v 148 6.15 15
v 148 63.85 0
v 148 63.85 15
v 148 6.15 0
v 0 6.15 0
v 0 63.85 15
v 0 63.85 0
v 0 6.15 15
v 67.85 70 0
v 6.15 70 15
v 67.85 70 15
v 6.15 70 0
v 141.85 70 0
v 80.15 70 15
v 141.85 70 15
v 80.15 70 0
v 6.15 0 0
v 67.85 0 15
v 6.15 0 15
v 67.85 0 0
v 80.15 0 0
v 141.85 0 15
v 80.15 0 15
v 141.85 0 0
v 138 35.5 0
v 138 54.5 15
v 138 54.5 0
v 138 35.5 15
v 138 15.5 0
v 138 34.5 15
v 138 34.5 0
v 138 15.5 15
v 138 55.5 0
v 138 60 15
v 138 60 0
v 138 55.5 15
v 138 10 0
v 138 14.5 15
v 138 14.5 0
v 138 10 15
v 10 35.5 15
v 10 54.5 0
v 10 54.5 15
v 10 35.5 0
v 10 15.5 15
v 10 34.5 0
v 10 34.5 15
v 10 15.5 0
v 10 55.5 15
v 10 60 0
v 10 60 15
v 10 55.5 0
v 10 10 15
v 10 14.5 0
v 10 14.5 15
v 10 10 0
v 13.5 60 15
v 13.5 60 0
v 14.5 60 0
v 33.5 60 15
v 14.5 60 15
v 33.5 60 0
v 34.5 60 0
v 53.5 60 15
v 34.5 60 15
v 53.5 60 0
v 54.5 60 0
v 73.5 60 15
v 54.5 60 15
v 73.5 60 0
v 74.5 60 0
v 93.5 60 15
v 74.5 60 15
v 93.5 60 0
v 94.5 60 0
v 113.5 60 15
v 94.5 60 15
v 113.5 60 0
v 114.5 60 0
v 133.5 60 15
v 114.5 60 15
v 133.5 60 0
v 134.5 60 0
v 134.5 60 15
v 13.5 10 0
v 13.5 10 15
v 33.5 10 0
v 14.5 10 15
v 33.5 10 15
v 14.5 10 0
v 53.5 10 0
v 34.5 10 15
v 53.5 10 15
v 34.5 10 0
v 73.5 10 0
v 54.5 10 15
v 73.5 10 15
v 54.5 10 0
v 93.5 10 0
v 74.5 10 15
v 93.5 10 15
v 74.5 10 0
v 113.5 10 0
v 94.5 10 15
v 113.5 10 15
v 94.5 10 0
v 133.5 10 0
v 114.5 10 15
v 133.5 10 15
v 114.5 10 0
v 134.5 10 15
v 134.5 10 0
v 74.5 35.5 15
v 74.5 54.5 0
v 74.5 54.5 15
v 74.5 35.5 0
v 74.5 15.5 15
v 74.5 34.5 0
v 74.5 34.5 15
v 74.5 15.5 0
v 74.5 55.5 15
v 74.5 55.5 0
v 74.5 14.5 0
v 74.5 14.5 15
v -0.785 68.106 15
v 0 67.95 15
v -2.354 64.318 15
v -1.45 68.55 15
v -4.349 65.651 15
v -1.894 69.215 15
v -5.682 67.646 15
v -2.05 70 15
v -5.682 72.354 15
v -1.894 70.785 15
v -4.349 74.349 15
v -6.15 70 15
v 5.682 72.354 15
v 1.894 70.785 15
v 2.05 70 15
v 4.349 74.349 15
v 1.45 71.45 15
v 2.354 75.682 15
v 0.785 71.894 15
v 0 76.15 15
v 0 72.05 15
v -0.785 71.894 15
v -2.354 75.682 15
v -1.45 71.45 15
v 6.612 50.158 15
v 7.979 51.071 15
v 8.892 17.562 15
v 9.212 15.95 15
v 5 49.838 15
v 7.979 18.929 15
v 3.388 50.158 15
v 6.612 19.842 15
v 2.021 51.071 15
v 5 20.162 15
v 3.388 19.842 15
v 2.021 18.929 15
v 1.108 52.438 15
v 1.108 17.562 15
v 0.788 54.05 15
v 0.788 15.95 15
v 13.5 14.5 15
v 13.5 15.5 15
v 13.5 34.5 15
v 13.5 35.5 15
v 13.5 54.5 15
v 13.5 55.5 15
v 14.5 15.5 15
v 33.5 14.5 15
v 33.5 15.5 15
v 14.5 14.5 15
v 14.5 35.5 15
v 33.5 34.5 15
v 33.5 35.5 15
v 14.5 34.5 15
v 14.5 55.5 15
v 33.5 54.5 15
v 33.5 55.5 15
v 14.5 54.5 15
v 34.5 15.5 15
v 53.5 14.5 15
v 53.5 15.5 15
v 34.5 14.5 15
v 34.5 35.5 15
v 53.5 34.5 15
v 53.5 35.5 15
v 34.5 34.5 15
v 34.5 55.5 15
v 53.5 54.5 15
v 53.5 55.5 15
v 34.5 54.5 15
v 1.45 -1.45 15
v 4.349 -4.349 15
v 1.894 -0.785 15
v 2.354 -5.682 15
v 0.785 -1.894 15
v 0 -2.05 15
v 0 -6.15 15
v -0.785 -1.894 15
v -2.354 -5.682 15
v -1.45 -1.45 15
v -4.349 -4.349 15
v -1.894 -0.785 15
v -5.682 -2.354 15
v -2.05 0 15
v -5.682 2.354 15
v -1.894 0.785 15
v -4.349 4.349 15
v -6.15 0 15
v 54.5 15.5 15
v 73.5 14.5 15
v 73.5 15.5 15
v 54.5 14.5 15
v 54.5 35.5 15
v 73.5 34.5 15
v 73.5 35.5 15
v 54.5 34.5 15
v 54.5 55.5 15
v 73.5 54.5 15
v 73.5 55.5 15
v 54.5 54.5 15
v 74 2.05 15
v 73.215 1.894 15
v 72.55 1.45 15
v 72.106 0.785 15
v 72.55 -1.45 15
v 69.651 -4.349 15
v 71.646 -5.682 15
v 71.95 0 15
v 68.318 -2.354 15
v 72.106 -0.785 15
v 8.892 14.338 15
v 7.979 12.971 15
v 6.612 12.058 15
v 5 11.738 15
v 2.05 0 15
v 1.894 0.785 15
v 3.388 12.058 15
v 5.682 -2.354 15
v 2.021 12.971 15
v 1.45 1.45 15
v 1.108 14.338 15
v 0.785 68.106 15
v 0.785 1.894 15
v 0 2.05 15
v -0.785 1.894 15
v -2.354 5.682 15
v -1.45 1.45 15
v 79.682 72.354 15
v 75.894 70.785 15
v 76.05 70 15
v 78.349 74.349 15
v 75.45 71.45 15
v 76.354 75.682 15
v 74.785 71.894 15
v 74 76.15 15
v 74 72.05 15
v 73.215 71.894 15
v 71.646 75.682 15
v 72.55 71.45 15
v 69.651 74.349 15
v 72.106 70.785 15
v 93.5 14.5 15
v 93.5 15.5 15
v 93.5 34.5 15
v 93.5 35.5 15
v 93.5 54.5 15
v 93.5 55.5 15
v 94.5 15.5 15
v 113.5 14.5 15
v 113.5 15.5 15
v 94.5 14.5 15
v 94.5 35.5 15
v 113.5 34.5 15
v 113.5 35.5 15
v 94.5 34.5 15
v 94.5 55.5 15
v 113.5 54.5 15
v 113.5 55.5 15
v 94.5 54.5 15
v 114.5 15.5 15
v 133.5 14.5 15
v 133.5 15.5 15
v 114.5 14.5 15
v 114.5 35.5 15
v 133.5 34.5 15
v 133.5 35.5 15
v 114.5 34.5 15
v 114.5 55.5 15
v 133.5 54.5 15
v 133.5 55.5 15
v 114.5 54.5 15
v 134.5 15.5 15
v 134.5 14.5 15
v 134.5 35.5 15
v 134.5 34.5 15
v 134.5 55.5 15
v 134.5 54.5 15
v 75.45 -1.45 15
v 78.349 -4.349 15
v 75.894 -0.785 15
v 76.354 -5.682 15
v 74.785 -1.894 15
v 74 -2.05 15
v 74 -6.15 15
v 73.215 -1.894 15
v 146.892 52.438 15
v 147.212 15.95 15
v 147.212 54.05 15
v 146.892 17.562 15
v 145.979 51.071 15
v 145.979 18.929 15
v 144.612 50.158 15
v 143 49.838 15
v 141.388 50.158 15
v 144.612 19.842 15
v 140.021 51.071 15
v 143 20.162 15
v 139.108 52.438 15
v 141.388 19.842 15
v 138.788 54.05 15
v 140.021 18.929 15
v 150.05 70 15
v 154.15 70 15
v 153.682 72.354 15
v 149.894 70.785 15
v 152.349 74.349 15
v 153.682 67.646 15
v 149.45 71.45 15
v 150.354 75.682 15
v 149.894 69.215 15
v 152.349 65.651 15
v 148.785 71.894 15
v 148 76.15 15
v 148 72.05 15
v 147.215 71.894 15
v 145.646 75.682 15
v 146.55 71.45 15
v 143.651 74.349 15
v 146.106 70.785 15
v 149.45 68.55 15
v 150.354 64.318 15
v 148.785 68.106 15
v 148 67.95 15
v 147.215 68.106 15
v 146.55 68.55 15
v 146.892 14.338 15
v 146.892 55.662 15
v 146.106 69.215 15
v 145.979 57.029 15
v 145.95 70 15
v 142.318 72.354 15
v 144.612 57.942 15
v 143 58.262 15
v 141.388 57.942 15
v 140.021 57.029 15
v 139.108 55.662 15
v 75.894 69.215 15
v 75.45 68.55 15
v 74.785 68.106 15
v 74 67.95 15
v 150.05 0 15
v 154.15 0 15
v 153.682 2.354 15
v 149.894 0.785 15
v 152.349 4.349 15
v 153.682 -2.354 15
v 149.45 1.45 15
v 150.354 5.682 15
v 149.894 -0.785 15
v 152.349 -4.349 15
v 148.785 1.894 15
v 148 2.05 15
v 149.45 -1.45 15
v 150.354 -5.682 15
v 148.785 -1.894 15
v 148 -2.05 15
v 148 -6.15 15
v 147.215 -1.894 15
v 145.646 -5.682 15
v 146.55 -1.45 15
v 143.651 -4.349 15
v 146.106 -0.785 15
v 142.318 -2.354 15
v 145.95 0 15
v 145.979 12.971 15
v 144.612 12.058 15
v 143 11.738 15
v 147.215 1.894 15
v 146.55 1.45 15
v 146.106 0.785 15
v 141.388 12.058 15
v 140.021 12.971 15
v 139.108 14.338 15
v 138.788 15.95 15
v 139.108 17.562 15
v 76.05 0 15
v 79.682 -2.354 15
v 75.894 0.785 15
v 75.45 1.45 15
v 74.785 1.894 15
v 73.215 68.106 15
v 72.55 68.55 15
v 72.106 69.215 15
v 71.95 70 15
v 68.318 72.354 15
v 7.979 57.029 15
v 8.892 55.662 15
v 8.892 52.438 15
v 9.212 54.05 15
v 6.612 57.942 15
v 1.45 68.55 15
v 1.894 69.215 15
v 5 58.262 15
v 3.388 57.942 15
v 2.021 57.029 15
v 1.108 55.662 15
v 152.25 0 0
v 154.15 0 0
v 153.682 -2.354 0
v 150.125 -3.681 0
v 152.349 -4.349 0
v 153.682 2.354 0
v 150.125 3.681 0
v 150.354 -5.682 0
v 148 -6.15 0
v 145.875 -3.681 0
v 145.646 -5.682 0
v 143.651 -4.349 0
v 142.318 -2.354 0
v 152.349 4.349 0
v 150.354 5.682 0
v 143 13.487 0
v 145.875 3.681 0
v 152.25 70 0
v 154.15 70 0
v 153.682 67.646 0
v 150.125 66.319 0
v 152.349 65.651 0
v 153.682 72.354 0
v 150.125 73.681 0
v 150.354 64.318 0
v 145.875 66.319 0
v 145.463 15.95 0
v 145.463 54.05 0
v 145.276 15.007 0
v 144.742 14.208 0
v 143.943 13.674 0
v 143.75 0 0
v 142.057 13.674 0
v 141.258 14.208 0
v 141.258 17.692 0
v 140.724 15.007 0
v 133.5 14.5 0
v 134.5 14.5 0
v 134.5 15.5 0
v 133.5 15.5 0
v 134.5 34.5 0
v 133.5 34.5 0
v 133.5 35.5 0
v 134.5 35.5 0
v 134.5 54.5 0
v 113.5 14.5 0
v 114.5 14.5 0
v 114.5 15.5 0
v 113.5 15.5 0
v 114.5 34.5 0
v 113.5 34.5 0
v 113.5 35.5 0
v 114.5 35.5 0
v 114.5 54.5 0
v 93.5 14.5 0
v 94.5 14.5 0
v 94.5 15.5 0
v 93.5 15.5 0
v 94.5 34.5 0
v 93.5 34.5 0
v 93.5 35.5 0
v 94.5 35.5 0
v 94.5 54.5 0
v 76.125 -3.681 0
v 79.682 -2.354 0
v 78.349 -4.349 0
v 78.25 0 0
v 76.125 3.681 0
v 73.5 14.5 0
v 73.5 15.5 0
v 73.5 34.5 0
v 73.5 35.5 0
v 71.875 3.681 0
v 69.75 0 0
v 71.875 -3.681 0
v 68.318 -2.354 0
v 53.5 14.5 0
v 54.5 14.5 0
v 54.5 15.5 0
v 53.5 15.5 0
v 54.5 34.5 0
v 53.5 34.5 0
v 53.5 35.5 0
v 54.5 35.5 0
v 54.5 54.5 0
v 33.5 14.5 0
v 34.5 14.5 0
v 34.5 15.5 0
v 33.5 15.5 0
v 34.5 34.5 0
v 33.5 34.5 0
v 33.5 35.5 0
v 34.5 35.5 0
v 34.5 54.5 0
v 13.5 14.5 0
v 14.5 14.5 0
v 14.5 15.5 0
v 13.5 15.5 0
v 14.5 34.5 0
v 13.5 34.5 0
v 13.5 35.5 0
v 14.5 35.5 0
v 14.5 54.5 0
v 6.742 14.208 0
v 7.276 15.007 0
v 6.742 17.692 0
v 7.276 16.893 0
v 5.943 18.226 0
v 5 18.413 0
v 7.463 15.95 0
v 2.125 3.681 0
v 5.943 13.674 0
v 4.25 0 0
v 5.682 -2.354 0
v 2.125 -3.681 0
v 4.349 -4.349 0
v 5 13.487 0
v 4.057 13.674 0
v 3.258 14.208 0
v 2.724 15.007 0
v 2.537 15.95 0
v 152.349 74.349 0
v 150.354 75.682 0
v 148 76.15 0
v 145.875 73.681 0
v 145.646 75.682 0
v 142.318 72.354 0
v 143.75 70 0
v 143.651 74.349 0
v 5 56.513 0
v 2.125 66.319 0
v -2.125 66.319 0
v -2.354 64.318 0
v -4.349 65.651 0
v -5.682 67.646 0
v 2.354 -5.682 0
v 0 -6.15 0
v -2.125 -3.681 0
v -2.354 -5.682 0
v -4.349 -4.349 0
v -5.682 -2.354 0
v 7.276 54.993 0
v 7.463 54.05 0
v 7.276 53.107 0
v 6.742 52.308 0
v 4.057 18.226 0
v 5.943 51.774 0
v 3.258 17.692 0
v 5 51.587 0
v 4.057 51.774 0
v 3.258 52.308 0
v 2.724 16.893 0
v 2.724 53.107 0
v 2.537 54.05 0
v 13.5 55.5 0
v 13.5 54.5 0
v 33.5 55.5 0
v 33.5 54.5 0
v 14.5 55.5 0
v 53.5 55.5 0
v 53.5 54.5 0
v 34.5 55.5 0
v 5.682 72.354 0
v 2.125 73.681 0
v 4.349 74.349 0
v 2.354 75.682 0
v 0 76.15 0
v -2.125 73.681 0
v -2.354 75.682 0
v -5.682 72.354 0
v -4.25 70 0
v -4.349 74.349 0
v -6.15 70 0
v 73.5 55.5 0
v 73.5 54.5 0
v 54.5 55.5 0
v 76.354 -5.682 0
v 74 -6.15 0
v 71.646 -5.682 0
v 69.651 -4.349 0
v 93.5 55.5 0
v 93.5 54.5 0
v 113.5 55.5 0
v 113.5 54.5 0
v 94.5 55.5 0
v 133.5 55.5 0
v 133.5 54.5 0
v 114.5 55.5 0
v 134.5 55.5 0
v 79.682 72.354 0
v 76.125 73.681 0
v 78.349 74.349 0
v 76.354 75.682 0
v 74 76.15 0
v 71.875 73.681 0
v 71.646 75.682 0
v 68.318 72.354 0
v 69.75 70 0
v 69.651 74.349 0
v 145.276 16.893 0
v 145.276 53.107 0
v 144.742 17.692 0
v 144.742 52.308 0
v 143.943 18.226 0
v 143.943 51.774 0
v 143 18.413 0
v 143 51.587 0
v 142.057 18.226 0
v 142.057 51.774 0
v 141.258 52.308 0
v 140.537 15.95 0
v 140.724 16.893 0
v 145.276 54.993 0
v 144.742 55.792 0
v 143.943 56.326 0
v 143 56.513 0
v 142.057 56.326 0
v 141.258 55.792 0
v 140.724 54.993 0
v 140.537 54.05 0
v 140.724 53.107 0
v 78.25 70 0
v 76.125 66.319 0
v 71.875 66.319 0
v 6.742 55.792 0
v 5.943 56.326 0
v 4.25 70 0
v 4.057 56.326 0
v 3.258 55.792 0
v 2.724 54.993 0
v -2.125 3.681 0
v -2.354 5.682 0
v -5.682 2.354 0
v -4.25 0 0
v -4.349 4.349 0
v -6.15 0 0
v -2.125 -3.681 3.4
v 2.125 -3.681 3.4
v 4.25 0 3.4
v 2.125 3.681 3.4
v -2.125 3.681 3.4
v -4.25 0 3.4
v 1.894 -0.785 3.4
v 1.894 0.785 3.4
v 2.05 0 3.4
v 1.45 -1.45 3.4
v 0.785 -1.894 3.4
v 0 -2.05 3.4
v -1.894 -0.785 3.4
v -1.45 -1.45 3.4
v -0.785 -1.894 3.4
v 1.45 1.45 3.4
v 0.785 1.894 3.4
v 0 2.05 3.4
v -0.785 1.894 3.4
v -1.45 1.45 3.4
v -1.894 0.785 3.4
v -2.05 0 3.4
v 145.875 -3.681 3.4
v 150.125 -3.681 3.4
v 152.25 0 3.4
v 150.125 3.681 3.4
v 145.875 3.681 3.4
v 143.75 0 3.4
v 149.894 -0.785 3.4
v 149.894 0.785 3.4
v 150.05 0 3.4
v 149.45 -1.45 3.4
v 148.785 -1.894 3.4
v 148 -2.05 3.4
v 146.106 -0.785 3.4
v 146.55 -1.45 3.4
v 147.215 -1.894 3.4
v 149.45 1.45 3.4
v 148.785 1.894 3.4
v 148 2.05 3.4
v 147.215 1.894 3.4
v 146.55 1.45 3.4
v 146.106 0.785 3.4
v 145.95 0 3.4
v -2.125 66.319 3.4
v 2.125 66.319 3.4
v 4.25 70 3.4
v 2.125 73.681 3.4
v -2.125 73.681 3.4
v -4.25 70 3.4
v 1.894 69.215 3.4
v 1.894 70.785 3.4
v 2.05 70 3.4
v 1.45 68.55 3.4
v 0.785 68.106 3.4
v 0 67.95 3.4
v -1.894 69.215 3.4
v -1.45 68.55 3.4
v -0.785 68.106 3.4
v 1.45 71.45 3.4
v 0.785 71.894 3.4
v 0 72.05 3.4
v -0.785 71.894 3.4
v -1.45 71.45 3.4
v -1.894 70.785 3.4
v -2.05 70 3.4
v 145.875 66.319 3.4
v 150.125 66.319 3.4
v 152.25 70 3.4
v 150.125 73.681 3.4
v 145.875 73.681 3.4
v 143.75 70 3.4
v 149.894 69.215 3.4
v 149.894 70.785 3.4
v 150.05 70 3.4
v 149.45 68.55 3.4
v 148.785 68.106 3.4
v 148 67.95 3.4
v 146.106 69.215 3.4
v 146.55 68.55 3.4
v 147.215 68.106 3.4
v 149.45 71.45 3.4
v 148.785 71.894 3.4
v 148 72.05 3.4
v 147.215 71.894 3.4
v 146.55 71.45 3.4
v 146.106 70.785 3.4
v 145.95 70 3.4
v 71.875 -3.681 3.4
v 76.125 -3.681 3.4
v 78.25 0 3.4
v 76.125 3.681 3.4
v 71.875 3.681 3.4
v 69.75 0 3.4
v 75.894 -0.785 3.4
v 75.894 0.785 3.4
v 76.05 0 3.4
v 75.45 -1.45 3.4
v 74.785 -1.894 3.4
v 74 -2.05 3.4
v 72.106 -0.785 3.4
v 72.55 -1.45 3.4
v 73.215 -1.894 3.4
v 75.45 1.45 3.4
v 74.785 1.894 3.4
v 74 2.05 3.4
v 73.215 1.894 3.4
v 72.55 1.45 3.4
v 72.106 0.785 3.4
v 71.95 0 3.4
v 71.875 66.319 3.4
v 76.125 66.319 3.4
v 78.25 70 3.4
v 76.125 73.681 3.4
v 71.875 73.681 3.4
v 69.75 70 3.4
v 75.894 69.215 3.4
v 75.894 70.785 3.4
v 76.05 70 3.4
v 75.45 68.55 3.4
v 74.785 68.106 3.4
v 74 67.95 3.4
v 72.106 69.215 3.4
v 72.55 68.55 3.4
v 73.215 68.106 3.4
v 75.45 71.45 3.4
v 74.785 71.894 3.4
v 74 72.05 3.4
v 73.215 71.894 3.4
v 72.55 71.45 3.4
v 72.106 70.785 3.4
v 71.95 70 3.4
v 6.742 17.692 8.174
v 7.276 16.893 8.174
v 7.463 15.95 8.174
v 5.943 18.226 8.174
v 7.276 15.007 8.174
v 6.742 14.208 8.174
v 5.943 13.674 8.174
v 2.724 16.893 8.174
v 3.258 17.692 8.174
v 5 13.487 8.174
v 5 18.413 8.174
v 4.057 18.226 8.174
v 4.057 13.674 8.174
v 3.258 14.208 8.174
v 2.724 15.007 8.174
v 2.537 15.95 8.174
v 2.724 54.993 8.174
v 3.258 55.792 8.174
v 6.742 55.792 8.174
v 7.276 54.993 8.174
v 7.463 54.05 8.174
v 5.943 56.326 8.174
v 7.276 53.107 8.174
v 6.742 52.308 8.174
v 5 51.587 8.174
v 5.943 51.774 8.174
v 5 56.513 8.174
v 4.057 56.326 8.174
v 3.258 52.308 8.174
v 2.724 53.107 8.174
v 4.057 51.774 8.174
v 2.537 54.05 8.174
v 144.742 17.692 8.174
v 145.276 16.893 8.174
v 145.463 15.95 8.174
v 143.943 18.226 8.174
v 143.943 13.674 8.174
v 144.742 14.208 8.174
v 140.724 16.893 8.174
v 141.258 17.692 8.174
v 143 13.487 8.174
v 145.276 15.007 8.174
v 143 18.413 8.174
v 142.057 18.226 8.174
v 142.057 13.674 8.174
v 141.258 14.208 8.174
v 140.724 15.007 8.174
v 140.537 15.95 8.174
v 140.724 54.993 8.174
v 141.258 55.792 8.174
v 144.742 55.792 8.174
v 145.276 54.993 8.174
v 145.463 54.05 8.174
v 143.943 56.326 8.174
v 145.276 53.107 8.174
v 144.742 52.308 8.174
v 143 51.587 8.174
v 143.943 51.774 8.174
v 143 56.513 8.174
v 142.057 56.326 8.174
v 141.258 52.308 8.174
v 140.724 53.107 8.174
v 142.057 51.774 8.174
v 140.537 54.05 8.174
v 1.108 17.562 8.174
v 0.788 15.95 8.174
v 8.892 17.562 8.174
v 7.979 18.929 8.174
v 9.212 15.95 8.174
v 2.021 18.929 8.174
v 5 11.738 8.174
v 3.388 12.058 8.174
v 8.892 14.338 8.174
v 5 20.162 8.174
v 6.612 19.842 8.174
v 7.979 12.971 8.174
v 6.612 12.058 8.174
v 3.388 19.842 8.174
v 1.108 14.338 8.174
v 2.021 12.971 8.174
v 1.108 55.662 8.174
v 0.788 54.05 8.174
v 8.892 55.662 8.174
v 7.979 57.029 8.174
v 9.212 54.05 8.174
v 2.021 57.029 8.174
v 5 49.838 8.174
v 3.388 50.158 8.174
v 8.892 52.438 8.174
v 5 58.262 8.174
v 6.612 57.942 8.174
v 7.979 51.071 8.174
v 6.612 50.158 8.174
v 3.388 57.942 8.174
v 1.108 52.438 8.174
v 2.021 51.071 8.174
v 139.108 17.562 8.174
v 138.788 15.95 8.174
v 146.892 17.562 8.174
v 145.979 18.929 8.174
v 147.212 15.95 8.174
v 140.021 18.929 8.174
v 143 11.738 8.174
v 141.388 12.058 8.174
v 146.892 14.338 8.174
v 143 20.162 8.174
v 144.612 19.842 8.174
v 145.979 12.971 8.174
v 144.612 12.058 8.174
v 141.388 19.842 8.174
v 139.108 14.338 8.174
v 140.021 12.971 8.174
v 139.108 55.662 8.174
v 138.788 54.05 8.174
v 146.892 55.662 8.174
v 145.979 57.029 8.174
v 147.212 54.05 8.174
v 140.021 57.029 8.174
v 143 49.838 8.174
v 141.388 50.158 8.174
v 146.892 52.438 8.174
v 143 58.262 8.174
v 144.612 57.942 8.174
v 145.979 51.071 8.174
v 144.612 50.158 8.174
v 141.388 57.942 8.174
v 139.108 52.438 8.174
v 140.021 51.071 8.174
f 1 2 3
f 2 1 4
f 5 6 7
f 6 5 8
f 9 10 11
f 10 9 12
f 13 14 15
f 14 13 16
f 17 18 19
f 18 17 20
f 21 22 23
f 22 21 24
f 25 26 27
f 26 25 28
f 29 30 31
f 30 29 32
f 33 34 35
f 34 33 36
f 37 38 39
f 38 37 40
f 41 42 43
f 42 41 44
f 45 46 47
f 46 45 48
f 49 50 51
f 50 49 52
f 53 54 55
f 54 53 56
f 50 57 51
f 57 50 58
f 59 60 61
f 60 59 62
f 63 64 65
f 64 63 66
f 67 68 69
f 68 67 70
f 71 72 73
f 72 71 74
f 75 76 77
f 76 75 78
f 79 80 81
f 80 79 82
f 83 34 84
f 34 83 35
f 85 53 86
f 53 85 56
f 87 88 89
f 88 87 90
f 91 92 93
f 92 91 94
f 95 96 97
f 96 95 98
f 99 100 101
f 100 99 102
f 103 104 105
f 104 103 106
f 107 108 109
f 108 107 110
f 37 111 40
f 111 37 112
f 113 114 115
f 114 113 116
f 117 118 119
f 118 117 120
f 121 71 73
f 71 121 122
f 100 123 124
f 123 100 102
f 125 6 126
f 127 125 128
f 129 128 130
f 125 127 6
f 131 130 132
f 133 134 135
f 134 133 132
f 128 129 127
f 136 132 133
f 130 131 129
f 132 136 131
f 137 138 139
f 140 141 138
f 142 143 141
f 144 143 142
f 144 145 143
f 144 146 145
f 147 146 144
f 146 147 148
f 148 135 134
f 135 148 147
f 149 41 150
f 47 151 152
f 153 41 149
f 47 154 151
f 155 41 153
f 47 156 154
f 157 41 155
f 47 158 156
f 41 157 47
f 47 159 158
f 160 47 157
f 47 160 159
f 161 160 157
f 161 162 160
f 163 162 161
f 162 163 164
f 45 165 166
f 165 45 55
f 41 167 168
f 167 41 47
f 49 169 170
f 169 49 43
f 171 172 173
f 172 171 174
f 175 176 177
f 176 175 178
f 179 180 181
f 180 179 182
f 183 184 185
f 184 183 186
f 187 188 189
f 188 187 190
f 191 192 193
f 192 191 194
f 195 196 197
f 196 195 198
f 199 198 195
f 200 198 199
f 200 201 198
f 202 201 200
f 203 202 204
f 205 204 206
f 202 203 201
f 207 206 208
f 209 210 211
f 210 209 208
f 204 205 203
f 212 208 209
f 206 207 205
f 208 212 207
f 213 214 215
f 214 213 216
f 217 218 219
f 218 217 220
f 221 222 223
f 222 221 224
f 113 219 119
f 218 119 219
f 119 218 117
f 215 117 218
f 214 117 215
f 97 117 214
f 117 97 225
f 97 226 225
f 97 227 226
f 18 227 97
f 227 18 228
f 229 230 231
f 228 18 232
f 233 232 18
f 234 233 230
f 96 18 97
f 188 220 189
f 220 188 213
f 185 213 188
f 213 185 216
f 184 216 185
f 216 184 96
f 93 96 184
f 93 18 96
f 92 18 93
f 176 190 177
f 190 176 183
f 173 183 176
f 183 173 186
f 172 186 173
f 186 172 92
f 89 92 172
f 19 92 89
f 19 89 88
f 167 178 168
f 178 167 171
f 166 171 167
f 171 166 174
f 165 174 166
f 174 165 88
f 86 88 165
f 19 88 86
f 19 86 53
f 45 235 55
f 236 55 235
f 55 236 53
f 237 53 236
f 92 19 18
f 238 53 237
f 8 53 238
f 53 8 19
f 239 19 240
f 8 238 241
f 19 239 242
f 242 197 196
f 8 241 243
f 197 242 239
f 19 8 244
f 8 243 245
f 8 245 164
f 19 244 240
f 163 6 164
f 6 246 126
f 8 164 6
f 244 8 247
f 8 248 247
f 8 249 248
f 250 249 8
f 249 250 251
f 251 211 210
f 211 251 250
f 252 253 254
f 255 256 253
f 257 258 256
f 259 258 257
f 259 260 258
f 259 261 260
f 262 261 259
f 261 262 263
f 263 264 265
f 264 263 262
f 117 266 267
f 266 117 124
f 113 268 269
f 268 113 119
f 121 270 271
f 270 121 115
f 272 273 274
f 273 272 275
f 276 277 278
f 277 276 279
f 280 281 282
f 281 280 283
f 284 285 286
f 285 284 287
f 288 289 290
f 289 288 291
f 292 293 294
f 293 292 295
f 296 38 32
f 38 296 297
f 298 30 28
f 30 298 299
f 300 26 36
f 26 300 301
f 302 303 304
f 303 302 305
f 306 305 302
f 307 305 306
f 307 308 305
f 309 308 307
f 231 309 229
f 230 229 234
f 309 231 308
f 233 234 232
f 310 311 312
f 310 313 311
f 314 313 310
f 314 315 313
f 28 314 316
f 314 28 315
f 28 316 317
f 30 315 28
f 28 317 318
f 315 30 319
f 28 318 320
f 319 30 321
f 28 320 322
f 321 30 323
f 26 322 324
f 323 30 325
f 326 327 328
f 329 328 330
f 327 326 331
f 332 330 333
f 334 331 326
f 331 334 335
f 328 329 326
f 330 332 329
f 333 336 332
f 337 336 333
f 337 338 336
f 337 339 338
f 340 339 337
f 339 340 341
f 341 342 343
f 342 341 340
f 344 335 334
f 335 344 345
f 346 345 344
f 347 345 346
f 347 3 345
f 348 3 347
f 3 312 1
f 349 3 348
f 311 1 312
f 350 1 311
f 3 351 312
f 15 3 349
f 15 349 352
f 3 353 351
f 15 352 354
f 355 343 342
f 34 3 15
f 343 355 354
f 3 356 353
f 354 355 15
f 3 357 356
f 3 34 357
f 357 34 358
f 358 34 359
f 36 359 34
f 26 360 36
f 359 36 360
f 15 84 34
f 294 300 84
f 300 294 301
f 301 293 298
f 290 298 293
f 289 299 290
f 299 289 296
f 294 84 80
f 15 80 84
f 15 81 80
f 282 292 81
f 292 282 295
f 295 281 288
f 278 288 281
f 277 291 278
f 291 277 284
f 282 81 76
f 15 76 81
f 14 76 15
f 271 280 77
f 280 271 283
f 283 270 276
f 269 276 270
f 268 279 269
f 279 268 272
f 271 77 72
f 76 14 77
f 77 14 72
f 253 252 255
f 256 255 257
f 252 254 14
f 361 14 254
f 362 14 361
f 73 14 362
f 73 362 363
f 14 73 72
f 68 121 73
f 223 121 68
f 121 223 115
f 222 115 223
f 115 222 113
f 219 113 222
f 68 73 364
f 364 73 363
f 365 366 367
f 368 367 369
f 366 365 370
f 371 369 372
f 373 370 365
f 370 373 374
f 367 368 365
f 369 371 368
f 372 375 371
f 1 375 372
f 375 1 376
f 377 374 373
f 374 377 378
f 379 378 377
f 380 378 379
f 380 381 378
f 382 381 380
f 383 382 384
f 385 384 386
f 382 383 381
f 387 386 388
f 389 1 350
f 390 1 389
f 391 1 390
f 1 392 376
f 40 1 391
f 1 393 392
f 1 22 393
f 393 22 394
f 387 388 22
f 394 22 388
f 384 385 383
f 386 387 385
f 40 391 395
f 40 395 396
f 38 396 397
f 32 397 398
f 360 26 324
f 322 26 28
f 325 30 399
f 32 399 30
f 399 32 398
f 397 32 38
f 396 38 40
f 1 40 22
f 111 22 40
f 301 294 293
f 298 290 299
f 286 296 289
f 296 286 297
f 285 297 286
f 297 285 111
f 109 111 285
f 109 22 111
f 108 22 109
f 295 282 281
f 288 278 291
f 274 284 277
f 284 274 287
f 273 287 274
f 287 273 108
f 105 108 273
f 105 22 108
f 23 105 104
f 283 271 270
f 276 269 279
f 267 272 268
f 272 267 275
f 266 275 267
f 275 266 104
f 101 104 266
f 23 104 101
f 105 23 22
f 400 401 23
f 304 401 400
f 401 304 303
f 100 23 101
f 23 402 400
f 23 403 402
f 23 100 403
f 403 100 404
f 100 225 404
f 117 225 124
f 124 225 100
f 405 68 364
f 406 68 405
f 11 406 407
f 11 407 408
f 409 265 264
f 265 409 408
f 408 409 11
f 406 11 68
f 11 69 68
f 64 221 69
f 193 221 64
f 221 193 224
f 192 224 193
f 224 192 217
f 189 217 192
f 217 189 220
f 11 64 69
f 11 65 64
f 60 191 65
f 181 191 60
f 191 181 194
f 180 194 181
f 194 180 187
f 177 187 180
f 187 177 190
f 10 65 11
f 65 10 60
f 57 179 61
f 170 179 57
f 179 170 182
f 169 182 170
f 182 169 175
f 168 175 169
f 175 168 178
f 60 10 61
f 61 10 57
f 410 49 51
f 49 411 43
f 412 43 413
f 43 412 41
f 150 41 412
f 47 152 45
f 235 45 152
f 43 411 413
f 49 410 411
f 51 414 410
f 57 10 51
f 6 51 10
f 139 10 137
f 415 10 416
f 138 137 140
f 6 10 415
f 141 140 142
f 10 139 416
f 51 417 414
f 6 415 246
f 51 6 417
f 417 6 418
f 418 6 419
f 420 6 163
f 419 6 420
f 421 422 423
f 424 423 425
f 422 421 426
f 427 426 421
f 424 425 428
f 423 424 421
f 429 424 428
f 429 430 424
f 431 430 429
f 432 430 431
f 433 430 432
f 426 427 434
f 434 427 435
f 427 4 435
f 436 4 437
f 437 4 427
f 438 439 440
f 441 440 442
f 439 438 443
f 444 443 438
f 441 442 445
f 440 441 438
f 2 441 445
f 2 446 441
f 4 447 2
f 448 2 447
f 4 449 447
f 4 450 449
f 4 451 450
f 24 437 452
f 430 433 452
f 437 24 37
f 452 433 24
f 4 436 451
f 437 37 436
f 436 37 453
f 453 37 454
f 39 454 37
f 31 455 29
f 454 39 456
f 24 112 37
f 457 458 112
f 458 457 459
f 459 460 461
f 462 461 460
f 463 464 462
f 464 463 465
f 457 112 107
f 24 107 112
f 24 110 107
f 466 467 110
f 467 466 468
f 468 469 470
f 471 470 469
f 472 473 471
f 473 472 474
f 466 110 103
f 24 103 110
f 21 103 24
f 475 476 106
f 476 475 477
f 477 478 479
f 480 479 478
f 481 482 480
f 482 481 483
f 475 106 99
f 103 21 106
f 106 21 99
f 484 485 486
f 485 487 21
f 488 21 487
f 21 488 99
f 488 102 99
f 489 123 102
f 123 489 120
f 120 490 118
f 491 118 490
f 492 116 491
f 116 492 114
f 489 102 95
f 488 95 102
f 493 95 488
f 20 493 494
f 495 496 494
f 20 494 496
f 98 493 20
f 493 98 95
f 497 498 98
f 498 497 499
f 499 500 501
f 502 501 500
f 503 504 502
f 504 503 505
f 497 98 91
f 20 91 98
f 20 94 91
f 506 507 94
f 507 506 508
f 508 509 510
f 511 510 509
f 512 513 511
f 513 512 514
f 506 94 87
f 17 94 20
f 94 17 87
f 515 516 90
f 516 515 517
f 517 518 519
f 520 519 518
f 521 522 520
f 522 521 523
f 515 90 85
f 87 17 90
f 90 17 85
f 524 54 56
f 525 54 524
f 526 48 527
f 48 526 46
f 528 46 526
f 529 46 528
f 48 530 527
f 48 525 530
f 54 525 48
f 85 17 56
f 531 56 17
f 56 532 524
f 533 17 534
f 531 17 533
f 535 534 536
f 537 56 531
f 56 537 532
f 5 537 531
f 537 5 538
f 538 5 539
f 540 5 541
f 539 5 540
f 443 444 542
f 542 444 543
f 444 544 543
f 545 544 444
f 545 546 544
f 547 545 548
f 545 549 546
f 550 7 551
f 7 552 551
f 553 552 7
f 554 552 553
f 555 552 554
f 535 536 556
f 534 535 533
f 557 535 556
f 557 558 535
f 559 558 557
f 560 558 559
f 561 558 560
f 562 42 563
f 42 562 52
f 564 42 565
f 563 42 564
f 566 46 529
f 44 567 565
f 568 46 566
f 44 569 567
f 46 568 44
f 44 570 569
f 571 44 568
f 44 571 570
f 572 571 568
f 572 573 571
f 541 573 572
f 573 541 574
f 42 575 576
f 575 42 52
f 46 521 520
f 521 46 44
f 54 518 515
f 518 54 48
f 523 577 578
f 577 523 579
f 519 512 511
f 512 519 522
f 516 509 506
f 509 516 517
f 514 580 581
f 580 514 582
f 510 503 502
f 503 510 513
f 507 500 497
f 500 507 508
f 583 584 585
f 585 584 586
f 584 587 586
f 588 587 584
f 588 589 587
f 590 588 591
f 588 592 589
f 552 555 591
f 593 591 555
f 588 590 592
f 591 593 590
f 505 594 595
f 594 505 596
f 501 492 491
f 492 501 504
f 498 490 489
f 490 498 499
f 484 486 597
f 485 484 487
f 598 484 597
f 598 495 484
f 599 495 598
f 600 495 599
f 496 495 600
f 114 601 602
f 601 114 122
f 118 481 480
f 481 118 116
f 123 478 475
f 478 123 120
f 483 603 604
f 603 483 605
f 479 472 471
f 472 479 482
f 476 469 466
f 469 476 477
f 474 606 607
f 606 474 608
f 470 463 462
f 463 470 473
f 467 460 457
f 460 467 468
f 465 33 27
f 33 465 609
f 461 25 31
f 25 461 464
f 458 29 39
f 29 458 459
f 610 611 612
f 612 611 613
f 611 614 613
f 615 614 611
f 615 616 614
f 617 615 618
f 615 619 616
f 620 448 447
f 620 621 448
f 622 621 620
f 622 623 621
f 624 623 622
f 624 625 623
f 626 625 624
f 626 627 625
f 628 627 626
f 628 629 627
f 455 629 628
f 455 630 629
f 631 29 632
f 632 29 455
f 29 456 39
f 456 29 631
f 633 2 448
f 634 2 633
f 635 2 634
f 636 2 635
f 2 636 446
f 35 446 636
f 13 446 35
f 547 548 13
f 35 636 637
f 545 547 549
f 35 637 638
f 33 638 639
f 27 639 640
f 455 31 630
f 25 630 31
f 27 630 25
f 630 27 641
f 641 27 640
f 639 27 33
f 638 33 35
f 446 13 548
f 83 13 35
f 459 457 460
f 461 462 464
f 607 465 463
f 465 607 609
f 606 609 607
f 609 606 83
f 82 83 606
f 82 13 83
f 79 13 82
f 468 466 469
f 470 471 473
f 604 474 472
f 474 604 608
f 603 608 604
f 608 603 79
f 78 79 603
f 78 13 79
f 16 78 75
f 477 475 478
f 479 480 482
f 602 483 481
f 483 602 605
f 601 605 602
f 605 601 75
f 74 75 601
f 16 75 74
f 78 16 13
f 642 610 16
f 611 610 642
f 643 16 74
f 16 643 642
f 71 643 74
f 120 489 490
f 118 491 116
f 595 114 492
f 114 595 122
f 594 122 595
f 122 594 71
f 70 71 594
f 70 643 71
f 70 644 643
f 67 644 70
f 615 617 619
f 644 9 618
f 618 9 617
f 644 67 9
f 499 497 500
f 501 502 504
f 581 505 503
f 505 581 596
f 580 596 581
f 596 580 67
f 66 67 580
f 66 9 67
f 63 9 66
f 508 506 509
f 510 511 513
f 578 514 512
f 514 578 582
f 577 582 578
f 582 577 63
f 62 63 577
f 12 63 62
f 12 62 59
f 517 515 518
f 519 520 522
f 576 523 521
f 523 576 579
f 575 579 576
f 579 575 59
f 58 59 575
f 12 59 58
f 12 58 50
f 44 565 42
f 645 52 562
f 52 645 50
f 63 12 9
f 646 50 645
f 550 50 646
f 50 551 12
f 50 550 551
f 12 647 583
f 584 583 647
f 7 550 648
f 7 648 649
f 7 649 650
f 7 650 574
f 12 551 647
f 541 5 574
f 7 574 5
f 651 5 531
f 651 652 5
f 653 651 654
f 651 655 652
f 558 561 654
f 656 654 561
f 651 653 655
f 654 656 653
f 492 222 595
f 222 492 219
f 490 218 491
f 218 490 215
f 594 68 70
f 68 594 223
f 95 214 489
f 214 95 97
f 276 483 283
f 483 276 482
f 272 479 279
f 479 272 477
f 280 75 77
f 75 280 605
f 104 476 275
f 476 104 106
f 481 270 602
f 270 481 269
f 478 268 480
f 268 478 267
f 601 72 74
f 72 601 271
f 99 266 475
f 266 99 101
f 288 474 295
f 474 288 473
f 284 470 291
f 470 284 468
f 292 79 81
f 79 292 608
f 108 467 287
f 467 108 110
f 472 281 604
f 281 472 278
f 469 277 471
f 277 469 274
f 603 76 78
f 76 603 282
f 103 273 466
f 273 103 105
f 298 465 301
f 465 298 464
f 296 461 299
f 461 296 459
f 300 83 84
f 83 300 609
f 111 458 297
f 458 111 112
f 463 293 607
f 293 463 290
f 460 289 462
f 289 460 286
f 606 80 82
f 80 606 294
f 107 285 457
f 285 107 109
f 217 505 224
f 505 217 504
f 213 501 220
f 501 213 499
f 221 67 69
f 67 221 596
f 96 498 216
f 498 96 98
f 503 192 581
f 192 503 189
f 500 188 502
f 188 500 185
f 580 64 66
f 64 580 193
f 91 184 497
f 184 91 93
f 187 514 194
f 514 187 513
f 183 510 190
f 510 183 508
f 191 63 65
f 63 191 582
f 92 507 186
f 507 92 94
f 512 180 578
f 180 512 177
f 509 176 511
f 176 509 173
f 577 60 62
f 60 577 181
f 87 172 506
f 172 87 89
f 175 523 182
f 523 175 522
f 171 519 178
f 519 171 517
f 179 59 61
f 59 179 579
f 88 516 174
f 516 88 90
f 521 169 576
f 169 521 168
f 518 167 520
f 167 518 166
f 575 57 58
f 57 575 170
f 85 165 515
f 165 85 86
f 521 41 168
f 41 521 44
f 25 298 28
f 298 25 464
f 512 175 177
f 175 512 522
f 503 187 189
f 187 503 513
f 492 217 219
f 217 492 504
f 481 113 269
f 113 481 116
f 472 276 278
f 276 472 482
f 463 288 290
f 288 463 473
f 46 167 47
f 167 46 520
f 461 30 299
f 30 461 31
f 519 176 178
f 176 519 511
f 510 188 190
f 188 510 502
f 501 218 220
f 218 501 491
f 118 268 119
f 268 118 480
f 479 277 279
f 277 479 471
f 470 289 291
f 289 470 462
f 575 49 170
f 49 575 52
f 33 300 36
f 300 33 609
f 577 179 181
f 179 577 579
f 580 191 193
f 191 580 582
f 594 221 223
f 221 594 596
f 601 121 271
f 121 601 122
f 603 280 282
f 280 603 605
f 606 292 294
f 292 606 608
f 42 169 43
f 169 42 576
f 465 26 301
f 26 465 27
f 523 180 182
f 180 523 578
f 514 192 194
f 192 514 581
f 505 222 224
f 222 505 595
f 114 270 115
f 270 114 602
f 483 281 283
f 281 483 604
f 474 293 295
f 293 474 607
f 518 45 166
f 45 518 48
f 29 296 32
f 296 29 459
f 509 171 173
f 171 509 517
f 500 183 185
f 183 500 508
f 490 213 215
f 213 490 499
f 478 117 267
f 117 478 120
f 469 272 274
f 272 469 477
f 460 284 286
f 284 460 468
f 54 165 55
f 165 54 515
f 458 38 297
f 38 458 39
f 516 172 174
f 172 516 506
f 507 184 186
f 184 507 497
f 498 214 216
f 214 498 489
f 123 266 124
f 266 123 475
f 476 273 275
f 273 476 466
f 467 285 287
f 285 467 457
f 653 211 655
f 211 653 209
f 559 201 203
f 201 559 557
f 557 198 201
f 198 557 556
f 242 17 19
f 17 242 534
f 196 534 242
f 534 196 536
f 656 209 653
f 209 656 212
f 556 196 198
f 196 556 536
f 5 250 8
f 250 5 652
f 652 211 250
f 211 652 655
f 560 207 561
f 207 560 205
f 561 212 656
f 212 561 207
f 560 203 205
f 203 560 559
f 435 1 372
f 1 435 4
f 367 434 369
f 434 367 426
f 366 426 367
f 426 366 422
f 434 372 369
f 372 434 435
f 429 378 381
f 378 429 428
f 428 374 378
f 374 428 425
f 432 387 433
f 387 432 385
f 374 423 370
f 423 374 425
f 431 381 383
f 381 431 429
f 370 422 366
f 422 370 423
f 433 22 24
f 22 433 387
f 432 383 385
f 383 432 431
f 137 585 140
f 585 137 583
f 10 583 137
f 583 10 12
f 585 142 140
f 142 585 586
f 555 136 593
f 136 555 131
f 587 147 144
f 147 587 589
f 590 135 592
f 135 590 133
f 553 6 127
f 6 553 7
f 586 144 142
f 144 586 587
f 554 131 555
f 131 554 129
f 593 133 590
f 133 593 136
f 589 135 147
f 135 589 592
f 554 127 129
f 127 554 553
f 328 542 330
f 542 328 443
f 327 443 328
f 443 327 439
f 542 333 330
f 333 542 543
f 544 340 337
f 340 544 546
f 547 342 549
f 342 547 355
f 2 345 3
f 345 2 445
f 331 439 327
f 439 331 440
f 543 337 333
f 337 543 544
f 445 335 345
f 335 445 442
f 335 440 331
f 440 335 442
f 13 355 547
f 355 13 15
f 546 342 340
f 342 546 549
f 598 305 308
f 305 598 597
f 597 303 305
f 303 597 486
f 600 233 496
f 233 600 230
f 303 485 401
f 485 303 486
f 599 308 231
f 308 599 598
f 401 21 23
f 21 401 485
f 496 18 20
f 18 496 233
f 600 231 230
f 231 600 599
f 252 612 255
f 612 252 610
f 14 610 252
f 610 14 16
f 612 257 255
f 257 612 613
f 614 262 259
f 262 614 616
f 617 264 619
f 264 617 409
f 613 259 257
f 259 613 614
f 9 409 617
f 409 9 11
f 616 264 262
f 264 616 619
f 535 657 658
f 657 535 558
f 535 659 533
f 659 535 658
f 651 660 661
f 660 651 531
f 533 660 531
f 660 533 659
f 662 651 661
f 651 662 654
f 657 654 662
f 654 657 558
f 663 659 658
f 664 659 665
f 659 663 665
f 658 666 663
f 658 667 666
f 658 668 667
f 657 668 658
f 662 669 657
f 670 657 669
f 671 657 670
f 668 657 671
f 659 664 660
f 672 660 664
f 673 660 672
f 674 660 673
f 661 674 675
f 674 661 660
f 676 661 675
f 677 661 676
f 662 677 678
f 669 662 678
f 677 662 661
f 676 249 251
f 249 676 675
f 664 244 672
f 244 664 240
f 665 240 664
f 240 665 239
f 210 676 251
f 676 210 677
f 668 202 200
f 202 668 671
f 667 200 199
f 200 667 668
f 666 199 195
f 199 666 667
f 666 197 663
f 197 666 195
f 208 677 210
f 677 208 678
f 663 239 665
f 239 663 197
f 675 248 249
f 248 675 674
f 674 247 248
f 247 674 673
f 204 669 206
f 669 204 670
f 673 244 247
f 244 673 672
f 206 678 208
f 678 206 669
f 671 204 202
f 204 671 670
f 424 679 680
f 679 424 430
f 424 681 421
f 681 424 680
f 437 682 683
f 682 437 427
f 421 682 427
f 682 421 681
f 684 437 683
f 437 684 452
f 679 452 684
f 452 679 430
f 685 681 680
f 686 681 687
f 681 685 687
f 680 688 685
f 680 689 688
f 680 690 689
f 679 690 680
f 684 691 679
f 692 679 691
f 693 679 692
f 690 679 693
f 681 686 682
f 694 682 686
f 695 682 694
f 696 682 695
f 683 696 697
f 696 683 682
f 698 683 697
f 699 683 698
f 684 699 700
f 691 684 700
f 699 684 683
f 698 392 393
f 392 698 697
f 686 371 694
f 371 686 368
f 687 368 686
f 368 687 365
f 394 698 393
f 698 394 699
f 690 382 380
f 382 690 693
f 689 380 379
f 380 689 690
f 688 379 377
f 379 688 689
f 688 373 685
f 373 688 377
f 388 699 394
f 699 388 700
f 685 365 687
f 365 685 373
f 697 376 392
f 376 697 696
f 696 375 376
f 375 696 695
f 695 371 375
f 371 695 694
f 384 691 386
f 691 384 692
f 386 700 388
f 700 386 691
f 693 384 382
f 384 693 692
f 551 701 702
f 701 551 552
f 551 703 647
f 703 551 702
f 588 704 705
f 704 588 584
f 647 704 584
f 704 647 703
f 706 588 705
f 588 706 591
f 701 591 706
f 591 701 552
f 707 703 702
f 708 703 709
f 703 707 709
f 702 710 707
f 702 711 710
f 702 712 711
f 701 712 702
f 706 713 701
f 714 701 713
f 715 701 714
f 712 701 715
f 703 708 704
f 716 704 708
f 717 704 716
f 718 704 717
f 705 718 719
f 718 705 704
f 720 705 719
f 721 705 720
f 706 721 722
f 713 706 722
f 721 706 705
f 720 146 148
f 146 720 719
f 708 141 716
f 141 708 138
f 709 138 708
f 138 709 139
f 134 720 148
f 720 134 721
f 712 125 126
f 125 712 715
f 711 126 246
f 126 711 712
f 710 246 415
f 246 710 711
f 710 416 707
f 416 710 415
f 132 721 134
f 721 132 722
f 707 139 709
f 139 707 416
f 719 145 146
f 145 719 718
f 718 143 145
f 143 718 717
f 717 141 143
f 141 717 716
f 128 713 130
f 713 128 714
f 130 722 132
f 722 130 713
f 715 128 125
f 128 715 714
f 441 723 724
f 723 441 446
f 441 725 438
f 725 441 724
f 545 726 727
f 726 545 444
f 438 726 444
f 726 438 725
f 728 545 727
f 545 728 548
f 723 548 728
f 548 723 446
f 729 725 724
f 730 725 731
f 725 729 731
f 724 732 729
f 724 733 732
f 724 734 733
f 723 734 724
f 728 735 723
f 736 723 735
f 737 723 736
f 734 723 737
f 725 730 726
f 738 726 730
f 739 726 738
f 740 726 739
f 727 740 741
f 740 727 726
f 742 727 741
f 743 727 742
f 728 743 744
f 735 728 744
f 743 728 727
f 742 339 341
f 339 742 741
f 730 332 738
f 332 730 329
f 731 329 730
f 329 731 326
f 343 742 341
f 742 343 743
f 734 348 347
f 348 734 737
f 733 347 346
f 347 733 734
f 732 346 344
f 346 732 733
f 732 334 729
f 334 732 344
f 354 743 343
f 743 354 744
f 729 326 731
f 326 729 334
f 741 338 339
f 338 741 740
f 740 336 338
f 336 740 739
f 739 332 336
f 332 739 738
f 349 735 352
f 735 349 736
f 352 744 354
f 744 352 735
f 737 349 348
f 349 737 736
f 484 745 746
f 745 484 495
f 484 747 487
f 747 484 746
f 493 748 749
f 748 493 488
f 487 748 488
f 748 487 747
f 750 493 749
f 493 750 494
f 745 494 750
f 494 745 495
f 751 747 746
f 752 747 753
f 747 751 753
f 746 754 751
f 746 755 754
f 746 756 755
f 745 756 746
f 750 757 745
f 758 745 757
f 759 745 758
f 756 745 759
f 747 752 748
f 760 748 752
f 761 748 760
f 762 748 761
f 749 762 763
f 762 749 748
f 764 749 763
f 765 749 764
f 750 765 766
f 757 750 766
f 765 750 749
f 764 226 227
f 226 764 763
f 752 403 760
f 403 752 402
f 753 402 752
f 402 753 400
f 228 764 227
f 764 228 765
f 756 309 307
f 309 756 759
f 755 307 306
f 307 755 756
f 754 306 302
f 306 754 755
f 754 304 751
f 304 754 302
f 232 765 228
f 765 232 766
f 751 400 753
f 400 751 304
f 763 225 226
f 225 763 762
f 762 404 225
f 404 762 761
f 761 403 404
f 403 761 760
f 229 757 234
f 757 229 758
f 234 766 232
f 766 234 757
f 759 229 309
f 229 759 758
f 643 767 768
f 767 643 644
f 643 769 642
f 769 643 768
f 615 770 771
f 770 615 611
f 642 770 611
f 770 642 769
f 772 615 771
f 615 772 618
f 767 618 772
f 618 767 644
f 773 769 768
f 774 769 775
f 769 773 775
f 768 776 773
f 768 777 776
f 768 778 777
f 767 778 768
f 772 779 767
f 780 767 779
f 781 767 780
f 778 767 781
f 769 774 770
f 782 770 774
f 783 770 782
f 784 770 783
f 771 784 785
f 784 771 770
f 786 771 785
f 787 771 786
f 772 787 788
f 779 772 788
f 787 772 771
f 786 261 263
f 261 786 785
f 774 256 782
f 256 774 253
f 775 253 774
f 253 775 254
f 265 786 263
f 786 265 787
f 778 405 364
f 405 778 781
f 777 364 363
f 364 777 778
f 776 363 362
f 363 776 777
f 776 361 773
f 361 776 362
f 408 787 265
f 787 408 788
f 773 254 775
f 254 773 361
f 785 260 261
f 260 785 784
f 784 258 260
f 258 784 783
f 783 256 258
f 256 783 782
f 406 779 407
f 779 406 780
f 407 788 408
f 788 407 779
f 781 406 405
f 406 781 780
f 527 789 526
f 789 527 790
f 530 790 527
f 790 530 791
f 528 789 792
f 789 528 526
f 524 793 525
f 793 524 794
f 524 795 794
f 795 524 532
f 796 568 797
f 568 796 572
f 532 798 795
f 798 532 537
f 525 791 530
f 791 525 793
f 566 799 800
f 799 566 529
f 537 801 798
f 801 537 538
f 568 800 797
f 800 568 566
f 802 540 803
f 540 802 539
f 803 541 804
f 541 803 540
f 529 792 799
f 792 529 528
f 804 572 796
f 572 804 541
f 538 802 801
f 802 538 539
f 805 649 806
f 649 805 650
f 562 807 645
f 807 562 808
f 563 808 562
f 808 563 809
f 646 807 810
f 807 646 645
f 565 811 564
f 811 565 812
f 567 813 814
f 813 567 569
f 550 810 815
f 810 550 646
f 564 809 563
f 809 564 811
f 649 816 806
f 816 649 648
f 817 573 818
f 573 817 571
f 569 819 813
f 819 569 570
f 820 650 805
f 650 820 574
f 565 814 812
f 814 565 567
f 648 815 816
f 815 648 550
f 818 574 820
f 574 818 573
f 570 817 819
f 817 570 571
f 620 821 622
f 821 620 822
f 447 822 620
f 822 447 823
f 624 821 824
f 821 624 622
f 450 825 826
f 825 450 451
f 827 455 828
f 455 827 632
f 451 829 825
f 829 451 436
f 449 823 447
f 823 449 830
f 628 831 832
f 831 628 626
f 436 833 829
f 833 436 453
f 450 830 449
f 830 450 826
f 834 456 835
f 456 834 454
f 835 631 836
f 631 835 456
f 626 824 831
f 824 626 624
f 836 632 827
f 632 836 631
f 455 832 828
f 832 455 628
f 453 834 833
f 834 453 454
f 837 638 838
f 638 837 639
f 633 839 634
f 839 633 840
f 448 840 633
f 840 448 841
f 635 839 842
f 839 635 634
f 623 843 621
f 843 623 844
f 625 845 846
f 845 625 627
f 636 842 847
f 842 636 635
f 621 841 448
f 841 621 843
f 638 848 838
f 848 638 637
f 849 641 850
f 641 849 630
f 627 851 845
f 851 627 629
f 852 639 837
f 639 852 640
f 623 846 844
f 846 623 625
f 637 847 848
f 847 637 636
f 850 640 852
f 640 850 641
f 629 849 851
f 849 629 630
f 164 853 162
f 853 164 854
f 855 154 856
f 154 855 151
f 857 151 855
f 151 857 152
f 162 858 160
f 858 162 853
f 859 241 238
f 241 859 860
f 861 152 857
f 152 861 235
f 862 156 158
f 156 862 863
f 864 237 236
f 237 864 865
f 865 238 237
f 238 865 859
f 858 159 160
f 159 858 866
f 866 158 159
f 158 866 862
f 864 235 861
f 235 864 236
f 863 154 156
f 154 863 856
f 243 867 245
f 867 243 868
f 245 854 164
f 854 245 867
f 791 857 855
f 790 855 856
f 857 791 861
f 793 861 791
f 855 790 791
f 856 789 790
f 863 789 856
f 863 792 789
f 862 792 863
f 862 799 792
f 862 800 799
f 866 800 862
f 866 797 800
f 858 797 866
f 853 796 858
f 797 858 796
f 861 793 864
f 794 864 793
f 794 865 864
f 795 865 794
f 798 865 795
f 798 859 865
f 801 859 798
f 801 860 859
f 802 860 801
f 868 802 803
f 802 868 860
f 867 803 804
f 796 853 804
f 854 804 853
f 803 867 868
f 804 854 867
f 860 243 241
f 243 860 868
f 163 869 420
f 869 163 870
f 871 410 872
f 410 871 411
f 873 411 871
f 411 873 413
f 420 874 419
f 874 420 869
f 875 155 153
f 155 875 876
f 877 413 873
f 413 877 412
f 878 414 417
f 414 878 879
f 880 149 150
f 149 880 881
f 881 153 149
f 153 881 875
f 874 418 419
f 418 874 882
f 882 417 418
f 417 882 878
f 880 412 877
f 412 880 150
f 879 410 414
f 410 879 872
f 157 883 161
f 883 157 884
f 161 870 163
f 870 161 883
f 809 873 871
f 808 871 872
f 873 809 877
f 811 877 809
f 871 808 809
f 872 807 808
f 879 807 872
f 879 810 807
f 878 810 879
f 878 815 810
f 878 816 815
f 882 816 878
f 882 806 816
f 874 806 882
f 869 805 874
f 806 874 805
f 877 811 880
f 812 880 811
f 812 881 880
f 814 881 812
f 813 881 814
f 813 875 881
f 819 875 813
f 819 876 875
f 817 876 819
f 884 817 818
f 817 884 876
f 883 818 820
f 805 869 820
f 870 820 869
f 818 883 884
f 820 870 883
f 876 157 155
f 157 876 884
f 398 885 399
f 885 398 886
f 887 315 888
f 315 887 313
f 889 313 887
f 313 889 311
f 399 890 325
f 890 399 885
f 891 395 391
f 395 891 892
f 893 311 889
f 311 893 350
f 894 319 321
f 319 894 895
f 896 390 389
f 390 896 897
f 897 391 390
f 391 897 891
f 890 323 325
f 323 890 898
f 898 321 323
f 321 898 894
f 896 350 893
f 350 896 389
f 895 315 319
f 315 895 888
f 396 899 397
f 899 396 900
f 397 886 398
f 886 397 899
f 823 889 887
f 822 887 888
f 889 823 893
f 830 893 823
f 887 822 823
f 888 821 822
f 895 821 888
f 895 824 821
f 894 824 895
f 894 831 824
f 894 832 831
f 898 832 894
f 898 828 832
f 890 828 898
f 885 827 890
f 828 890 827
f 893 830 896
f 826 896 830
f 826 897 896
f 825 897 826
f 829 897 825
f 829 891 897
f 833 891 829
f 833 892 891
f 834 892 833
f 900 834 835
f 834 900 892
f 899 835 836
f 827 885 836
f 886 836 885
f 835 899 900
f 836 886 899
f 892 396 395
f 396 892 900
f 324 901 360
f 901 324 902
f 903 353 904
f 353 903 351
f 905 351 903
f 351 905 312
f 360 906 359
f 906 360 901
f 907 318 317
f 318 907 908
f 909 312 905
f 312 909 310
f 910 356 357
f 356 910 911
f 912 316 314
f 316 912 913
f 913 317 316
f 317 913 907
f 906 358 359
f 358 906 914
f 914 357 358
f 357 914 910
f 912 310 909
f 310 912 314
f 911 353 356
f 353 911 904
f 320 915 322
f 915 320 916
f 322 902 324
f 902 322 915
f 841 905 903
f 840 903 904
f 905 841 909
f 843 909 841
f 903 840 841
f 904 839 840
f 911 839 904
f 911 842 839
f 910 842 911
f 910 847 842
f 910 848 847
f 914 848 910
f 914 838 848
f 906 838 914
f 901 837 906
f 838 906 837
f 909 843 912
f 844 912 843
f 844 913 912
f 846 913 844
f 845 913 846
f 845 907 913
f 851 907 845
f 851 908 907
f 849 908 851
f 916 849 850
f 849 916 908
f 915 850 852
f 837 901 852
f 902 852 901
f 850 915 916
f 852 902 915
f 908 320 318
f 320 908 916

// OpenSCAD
// file: grid.scad
/* This module creates grids. */

module grid(
   gridX, 
   gridY, 
   borderX, 
   borderY, 
   meshSolid,    // width of solid part of grid
   meshSpace,    // width of space part of grid
   thickness) {  // z height 

   /* Calculate the size of the dimensions of the meshed area. */
   meshX=gridX-(borderX*2);
   meshY=gridY-(borderY*2);

   echo (meshX,  meshY);

   /* Calculate the number of lines in the meshed area. */
   nX=floor(meshX/(meshSolid+meshSpace));
   nY=floor(meshY/(meshSolid+meshSpace));
   gridSize = meshSolid + meshSpace;
   echo (nX, nY, gridSize);


   intersection () {

      union() {
         /* 
          *  Draw the border box centered. 
          */
         difference() {
            cube (size=[gridX,gridY,thickness+ 2], center=true);
            cube (size=[meshX,meshY,thickness+ 2], center=true);
         } /* enddifference */
         
      
         /* 
          *  Draw the grid centered. 
          */
      
         /* Draw the lines parallel to y axis. */
         translate([-1 * (meshSolid / 2), 0, -1 * (thickness / 2)])
            union() {
               for (i = [0 : ceil(nX / 2)]) {
                  translate([i*(meshSolid+meshSpace), -1 * (gridY / 2), 0]) 
                     cube(size=[meshSolid, gridY, thickness]);
               } /* endfor */
               for (i = [0 : ceil(nX / 2)]) {
                  translate([-1 * i*(meshSolid+meshSpace), -1 * (gridY / 2), 0]) 
                     cube(size=[meshSolid, gridY, thickness]);
               } /* endfor */
            } /* endunion */
         
         /* Draw the lines parallel to the x axis. */
         translate([0, -1 * (meshSolid / 2), -1 * (thickness / 2)])
            union() {
               for (i = [0 : ceil(nY / 2)]) {
                  translate([-1 * (gridX / 2), i*(meshSolid+meshSpace), 0]) 
                     cube(size=[gridX, meshSolid, thickness]);
               } /* endfor */
               for (i = [0 : ceil(nY / 2)]) {
                  translate([-1 * (gridX / 2), -1 * i*(meshSolid+meshSpace), 0]) 
                     cube(size=[gridX, meshSolid, thickness]);
               } /* endfor */
            } /* endunion */
      } /* endunion */

      /* Slice off all the extra line widths on the edges. */
      cube (size=[gridX,gridY,thickness], center=true);

   } /* endintersection */

} /* endmodule */


grid(21, 41, 0, 0, 2, 8, 5);
   
// main file
/* This is a jig for holding the rpi door controller PCB
   on a Sherline 5000 mill for isolation milling.  */
use <MCAD/nuts_and_bolts.scad>;
use <grid.scad>;

$fn = 16;

/* Set overall piece dimensions. */
x = 148;
y = 70;
z = 15;
x_border = 10;
y_border = 10;
grid_size = 20;
grid_line_width = 1;

/* Set the screw size in mm. */
screw_size = 4.1;

/* 
 *  Set the mounting bolt dimensions. 
 */

/* Use a #10 socket head cap screw. */
bolt_dia = (0.19 * 25.4) + 0.1; 
bolt_head_dia = (0.312 * 25.4) + 0.5;   
bolt_head_height = (0.19 * 25.4) + 2;

/* Set the distance between mounting holes. */
mount_hole_dist = (1.5 * 25.4); // 1.5 in



/****** Calculated Values *******/
mount_hole_x_offset = x_border / 2; 


difference() {

   union() {
      translate([(x / 2), y / 2, (z / 2)])
         grid(x, y, x_border, y_border, grid_line_width, 
              grid_size - grid_line_width, z);
   
      cylinder(h = z, r = screw_size * 1.5);
      translate([x, 0, 0]) cylinder(h = z, r = screw_size * 1.5);
      translate([0, y, 0]) cylinder(h = z, r = screw_size * 1.5);
      translate([x, y, 0]) cylinder(h = z, r = screw_size * 1.5);
      translate([x / 2, 0, 0]) cylinder(h = z, r = screw_size * 1.5);
      translate([x / 2, y, 0]) cylinder(h = z, r = screw_size * 1.5);
   } /* endunion */
   

   translate([0, 0, 0]) {
      nutHole(size=4, tolerance=0.2);
      cylinder(h = z, r = screw_size / 2);
   } /* endtranslate */

   translate([x, 0, 0]) {
      nutHole(size=4, tolerance=0.2);
      cylinder(h = z, r = screw_size / 2);
   } /* endtranslate */

   translate([0, y, 0]) {
      nutHole(size=4, tolerance=0.2);
      cylinder(h = z, r = screw_size / 2);
   } /* endtranslate */

   translate([x, y, 0]) {
      nutHole(size=4, tolerance=0.2);
      cylinder(h = z, r = screw_size / 2);
   } /* endtranslate */

   translate([x / 2, 0, 0]) {
      nutHole(size=4, tolerance=0.2);
      cylinder(h = z, r = screw_size / 2);
   } /* endtranslate */

   translate([x / 2, y, 0]) {
      nutHole(size=4, tolerance=0.2);
      cylinder(h = z, r = screw_size / 2);
   } /* endtranslate */


   /* 
    *  Add some holes for the #10 socket head cap screws that
    *  attach the plate to the base. 
    */
  

   /* Subtract the bolt holes. */
   translate([mount_hole_x_offset, 
              (y / 2) - (mount_hole_dist / 2), 
              0])
      cylinder(h = z, r = bolt_dia / 2);
   translate([mount_hole_x_offset, 
              (y / 2) + (mount_hole_dist / 2), 
              0])
      cylinder(h = z, r = bolt_dia / 2);
   translate([x - mount_hole_x_offset, 
              (y / 2) - (mount_hole_dist / 2), 
              0])
      cylinder(h = z, r = bolt_dia / 2);
   translate([x - mount_hole_x_offset, 
              (y / 2) + (mount_hole_dist / 2), 
              0])
      cylinder(h = z, r = bolt_dia / 2);


   /* Subtract the bolt head holes. */
   translate([mount_hole_x_offset, 
              (y / 2) - (mount_hole_dist / 2), 
              z - bolt_head_height])
      cylinder(h = z, r = bolt_head_dia / 2);
   translate([mount_hole_x_offset, 
              (y / 2) + (mount_hole_dist / 2), 
              z - bolt_head_height])
      cylinder(h = z, r = bolt_head_dia / 2);
   translate([x - mount_hole_x_offset, 
              (y / 2) - (mount_hole_dist / 2), 
              z - bolt_head_height])
      cylinder(h = z, r = bolt_head_dia / 2);
   translate([x - mount_hole_x_offset, 
              (y / 2) + (mount_hole_dist / 2), 
              z - bolt_head_height])
      cylinder(h = z, r = bolt_head_dia / 2);

} /* enddifference */
